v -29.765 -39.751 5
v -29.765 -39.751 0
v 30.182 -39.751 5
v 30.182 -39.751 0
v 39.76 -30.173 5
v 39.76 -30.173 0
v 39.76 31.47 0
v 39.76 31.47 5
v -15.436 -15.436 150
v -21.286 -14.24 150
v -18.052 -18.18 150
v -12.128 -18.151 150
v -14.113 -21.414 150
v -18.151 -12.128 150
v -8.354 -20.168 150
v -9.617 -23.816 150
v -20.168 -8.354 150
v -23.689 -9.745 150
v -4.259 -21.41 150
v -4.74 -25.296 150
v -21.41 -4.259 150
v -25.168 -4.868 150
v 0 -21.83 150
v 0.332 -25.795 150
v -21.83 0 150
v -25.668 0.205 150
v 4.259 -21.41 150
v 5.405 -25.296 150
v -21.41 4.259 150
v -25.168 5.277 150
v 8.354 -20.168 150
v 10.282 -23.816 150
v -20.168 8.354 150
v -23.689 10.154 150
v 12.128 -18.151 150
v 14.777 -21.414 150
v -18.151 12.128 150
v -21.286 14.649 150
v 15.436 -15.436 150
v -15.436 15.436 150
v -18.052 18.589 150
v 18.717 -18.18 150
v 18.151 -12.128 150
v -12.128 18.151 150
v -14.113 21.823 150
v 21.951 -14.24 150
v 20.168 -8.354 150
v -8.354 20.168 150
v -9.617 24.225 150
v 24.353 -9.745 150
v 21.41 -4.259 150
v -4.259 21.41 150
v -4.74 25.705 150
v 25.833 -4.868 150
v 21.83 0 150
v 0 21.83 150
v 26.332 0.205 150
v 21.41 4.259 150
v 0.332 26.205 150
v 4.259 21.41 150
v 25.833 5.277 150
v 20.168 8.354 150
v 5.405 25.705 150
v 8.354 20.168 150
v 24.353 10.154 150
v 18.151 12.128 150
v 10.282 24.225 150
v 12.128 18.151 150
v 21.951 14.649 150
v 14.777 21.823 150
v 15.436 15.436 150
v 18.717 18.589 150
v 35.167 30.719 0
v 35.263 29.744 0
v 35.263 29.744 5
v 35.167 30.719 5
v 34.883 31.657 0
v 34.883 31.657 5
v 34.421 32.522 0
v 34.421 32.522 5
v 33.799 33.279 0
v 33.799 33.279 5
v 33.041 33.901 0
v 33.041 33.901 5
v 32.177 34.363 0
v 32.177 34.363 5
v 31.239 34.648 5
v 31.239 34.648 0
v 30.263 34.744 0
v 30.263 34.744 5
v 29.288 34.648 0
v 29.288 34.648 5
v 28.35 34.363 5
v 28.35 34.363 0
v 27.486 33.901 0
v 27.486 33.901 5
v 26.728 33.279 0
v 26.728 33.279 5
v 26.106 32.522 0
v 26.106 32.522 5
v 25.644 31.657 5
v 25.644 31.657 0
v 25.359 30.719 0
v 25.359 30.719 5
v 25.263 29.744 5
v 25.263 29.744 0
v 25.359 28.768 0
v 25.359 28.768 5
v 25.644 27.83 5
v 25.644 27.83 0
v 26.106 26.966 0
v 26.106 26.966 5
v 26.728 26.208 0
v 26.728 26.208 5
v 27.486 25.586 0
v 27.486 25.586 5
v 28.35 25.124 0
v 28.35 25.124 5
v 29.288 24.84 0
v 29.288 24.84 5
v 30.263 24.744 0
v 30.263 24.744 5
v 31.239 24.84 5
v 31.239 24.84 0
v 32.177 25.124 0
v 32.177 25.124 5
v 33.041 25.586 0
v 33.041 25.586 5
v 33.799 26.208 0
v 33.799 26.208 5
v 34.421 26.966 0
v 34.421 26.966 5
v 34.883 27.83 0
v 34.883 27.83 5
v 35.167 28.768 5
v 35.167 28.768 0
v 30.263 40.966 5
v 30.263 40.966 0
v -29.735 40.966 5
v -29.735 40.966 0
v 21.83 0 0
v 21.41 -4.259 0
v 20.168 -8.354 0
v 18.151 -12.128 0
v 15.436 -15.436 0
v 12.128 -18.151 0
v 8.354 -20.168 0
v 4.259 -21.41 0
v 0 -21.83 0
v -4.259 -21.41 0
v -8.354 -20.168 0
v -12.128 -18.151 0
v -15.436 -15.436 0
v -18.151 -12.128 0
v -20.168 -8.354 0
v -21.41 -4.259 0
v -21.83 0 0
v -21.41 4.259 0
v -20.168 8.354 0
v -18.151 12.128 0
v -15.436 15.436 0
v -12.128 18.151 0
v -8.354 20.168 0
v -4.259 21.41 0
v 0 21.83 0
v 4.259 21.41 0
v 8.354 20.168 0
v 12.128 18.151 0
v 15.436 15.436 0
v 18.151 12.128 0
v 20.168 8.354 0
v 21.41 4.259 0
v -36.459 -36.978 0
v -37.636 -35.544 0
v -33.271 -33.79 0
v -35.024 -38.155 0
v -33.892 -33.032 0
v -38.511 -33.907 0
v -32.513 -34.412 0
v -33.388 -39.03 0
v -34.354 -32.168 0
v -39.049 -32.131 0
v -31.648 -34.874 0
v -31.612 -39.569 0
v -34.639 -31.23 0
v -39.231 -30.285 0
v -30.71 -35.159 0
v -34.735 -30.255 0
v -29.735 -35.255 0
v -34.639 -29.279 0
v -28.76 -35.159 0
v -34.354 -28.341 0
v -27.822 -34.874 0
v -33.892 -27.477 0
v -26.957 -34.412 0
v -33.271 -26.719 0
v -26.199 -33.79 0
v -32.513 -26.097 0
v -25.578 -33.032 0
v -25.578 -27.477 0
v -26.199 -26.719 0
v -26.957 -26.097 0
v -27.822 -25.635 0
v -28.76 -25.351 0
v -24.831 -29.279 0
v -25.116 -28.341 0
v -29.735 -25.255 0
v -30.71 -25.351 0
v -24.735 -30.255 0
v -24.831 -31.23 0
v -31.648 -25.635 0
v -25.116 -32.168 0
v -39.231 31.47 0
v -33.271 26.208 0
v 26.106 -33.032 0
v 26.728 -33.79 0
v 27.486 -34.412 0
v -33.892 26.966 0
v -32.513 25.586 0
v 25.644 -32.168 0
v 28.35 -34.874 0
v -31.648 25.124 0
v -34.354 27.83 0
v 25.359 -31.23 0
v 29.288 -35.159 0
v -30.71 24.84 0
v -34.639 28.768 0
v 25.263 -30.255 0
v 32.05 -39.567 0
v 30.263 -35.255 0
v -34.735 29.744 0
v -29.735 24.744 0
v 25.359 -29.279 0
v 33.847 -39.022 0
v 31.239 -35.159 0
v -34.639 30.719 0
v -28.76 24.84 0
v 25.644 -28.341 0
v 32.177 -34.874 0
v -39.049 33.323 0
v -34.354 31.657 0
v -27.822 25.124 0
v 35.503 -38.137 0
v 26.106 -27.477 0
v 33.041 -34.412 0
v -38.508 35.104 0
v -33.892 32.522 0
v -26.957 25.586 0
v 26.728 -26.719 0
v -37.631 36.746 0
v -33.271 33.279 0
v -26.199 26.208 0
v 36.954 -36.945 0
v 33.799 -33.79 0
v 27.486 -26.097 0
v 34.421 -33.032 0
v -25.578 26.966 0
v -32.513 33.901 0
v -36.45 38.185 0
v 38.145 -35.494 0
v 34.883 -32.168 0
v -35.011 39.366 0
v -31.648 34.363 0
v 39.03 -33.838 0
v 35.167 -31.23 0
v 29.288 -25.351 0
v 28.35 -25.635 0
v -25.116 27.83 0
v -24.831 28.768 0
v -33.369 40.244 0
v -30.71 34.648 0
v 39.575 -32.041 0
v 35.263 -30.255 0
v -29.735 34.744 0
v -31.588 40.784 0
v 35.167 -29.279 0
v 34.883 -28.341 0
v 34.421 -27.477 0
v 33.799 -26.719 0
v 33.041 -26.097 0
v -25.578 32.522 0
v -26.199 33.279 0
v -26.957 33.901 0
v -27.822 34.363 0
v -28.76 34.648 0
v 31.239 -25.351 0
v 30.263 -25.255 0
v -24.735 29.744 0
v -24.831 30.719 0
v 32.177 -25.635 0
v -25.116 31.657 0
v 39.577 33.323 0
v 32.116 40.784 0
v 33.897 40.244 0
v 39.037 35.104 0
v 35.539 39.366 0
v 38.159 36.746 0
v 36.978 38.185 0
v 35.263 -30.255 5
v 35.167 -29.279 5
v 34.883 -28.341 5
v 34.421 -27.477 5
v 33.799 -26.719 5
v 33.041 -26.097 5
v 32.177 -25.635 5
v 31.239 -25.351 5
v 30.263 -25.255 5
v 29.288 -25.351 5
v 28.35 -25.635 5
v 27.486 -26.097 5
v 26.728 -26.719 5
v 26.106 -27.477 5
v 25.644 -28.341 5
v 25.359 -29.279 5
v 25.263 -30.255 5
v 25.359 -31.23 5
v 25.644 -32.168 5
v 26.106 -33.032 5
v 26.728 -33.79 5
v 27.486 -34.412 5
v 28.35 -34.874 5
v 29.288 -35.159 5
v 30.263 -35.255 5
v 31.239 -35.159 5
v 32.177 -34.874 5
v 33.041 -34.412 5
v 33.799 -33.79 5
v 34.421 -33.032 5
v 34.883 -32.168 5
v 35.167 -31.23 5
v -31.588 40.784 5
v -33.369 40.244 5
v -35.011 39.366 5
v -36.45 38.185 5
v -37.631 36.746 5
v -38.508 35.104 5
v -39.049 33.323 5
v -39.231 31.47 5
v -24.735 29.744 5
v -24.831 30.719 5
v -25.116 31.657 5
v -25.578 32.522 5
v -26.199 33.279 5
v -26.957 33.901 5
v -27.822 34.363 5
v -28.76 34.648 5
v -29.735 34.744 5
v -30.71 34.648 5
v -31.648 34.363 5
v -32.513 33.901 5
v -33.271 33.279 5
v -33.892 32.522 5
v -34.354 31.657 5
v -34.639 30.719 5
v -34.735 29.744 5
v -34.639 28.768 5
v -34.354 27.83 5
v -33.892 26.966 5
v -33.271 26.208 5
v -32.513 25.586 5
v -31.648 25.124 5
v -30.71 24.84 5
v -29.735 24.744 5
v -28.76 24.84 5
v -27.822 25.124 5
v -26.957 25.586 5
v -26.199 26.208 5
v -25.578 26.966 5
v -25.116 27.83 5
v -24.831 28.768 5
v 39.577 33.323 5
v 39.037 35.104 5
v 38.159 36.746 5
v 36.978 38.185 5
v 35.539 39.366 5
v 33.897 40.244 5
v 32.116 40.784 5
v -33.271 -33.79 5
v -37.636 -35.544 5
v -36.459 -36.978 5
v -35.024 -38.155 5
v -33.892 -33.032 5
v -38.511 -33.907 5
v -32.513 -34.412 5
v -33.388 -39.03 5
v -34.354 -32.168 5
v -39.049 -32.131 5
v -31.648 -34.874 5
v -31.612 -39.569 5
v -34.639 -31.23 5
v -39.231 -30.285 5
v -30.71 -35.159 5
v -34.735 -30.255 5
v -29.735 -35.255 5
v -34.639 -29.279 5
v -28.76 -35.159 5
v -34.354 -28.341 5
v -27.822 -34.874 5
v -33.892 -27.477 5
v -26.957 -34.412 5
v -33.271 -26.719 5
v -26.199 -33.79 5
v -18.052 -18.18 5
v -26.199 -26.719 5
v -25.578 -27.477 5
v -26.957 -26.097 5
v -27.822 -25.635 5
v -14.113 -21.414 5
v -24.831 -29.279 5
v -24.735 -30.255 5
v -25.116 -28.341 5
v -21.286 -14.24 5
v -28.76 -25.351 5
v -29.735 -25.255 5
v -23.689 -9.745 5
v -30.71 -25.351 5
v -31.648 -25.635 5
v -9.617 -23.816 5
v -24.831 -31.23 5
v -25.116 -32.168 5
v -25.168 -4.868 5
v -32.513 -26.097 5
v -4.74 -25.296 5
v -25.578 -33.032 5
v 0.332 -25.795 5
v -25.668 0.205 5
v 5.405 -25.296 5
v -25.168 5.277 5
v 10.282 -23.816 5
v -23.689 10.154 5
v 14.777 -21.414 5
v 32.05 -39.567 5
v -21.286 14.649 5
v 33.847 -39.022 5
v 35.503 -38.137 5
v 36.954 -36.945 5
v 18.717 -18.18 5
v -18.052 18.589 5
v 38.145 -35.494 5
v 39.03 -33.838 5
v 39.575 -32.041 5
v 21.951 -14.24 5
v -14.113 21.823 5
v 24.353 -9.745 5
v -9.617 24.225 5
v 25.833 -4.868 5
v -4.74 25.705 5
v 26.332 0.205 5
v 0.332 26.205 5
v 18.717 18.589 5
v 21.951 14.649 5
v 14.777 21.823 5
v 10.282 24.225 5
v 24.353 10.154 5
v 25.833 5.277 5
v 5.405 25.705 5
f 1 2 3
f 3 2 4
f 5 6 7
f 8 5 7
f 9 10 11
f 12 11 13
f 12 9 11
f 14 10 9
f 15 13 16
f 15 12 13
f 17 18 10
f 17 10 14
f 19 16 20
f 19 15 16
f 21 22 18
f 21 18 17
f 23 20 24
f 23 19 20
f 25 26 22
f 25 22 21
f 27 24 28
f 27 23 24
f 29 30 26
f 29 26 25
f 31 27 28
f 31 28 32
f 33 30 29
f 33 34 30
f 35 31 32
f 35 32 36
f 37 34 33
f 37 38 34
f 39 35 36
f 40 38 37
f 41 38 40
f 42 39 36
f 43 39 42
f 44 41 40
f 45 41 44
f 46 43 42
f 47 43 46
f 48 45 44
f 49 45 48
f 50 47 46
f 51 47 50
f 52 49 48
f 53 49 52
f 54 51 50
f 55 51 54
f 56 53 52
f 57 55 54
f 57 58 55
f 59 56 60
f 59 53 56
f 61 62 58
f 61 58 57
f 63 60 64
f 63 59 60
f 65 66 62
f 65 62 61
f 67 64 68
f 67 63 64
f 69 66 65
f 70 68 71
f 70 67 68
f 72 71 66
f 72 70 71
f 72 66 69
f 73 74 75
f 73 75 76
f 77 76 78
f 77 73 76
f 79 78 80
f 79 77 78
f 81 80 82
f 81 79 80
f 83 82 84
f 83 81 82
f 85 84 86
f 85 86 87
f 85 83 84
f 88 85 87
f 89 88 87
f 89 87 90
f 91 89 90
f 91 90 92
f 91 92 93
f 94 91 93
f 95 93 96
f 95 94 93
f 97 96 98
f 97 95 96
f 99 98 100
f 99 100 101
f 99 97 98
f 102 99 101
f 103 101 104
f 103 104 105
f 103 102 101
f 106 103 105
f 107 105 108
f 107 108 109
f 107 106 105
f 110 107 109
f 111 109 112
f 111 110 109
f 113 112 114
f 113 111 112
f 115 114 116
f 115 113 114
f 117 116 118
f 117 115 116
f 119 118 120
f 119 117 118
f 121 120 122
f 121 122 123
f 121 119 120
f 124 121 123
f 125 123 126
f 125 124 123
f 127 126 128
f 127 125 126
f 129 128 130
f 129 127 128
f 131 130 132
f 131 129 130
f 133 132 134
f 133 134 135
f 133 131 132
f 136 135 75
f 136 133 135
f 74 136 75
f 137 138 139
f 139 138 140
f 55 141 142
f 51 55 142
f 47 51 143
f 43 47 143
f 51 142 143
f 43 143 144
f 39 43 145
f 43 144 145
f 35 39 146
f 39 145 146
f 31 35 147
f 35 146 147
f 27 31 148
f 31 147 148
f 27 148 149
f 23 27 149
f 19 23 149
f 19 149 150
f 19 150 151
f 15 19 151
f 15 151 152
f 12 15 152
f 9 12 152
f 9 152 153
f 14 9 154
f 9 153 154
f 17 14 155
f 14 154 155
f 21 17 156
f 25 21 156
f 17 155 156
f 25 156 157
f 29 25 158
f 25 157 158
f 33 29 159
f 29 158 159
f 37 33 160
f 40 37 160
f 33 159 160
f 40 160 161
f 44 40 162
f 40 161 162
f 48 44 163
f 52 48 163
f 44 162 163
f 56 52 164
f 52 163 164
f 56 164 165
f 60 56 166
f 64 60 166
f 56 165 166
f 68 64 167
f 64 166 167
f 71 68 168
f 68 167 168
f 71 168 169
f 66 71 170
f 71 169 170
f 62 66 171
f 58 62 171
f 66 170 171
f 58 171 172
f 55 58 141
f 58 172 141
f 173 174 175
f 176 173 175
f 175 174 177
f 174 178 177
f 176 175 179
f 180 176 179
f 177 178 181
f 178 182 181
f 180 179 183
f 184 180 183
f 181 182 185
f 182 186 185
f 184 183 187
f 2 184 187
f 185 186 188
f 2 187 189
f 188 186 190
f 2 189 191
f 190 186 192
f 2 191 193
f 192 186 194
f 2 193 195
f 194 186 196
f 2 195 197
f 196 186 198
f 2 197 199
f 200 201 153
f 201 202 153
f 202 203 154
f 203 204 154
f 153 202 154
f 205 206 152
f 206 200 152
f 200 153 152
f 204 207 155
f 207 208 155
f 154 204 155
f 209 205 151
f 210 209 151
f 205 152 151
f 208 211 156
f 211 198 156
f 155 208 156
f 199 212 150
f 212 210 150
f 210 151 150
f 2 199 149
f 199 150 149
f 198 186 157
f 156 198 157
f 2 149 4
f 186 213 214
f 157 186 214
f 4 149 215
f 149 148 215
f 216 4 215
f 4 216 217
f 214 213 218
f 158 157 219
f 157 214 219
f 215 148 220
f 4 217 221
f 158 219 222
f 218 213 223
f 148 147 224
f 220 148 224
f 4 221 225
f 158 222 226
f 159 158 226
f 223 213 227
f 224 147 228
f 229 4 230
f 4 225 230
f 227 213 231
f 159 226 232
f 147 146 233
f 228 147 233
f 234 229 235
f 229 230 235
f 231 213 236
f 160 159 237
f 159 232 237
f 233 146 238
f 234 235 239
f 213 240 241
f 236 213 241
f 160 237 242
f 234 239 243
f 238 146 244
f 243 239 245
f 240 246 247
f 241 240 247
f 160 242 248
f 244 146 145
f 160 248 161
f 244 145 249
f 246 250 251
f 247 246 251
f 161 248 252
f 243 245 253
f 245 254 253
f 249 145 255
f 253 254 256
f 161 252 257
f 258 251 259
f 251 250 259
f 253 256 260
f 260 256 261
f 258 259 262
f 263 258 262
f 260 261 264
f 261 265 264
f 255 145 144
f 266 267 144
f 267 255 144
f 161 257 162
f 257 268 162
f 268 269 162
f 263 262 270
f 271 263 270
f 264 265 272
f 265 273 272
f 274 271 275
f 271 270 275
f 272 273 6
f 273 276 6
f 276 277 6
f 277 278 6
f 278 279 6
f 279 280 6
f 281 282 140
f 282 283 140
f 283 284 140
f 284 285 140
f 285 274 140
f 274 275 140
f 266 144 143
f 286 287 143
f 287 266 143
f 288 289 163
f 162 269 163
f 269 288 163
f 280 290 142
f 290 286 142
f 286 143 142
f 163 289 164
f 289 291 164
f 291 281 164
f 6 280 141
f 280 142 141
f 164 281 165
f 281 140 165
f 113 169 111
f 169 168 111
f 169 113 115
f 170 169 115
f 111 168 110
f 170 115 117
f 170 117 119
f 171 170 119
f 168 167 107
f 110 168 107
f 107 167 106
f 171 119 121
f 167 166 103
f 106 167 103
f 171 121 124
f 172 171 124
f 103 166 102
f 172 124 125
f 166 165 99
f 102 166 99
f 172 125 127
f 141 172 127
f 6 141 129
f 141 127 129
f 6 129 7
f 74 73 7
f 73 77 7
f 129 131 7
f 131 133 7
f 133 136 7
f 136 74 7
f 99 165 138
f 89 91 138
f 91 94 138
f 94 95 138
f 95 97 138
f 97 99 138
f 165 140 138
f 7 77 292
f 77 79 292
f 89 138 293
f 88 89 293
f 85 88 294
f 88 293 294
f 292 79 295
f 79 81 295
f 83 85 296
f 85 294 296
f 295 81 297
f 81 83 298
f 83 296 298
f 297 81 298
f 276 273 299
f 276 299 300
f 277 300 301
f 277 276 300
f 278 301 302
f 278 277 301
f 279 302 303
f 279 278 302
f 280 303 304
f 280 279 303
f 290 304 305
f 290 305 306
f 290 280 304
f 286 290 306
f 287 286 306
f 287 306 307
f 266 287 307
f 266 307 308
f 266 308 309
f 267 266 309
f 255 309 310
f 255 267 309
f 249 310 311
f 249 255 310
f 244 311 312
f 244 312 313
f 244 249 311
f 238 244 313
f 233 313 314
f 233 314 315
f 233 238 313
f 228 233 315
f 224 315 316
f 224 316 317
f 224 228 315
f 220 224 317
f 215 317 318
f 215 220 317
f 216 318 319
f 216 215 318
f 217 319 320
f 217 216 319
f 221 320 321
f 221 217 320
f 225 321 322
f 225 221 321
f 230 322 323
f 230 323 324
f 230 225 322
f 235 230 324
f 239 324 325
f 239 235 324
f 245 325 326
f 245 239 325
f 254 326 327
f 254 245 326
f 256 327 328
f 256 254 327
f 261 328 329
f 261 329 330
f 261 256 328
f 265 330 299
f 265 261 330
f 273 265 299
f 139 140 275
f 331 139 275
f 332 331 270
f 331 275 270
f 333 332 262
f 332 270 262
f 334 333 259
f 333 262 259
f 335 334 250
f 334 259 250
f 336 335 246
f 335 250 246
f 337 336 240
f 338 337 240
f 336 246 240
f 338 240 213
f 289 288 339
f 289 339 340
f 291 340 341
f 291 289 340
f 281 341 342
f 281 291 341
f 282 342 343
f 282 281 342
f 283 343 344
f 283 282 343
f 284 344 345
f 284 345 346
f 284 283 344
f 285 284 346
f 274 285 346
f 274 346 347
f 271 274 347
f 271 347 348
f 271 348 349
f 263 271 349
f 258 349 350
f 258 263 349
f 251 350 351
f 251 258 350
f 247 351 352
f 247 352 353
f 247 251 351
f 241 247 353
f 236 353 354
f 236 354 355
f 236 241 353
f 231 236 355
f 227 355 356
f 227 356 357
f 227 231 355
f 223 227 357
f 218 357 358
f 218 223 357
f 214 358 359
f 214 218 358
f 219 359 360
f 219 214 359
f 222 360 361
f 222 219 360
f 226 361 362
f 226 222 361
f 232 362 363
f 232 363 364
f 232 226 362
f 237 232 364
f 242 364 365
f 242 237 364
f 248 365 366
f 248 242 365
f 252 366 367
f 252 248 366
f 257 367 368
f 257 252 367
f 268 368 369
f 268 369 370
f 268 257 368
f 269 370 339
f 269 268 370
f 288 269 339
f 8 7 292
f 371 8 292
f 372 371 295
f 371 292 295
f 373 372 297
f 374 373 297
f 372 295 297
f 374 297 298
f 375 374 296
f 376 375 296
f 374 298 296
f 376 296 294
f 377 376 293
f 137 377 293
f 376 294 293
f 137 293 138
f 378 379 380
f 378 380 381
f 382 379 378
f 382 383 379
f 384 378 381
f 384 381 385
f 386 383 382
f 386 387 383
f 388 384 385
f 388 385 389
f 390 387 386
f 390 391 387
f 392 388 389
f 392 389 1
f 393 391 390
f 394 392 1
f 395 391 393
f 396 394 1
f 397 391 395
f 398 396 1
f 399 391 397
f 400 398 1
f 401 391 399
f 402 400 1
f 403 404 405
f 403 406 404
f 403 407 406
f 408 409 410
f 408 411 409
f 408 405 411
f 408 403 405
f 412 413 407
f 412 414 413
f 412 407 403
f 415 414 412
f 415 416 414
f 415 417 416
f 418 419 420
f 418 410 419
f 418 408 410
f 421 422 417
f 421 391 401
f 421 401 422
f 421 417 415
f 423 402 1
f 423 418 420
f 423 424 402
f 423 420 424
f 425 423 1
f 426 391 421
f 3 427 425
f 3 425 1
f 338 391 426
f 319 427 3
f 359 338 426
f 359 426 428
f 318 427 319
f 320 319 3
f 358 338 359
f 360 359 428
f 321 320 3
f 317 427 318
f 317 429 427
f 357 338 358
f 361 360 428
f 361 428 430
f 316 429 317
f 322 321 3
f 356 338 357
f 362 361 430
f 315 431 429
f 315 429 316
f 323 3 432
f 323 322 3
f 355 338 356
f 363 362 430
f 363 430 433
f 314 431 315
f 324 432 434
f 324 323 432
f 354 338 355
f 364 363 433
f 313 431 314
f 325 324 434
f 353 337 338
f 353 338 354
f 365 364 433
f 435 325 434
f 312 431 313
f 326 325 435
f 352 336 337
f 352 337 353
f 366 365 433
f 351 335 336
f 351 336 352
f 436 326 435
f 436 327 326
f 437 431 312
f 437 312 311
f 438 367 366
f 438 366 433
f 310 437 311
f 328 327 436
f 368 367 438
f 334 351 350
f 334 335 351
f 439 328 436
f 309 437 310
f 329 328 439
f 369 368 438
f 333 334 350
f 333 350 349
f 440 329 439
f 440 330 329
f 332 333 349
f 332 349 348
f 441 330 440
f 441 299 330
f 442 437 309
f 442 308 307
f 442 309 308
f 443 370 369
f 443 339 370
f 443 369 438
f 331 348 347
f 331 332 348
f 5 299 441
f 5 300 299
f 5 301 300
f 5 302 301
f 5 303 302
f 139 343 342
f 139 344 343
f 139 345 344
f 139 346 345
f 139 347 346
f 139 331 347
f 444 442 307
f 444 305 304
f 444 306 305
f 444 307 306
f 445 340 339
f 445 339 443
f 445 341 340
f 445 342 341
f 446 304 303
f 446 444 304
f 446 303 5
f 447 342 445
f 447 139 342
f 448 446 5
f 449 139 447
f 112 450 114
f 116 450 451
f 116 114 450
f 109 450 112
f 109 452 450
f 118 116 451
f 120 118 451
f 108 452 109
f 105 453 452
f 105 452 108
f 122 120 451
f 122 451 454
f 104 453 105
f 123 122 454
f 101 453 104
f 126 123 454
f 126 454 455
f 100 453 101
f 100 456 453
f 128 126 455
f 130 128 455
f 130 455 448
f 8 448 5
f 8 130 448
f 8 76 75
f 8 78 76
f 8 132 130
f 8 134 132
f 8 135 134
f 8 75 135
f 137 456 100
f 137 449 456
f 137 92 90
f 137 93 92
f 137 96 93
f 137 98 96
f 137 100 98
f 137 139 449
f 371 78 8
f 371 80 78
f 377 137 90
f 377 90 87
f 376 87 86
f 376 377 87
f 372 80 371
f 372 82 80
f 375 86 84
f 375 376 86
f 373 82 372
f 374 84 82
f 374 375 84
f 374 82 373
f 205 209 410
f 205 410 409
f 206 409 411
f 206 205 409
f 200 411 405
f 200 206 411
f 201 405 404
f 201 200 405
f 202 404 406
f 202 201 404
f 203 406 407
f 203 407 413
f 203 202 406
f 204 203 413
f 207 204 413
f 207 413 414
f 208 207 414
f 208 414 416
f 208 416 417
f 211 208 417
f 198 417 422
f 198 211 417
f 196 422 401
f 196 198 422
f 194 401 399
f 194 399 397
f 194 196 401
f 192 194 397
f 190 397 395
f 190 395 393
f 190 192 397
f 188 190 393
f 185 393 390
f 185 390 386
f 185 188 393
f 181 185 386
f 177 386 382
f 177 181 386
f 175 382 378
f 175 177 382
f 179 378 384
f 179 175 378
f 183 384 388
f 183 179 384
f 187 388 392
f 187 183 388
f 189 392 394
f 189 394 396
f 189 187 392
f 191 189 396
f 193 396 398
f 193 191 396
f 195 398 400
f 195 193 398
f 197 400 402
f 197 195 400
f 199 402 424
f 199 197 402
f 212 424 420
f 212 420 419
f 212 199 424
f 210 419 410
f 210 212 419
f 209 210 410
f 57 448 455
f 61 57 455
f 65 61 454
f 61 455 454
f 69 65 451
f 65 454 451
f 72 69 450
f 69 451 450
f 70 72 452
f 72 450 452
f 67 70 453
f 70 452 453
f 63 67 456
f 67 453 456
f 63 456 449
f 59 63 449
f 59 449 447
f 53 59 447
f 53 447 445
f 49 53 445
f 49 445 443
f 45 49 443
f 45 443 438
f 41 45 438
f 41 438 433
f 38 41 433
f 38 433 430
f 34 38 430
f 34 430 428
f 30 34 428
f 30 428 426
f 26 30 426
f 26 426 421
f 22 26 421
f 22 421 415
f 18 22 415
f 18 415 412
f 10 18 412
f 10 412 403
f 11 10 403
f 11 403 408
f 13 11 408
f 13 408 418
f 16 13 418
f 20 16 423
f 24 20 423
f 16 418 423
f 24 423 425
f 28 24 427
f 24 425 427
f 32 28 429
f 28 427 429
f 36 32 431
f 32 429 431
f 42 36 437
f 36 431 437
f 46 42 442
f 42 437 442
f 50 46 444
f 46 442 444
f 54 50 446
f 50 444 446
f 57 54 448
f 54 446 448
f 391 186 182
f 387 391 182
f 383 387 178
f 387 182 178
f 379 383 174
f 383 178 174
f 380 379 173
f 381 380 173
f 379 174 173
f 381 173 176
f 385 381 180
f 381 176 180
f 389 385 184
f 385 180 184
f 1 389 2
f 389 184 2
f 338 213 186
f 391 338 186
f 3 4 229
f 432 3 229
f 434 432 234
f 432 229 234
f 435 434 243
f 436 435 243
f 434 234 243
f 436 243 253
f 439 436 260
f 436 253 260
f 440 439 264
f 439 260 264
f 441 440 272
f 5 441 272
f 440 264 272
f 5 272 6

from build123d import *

# Parameters (mm, degrees)
SKETCH_R     = 5
PAD_DEPTH    = 5
SKETCH002_R  = 26
PAD001_DEPTH = 150
SKETCH001_R  = 21.829625
POCKET_DEPTH = 150


with BuildPart() as part:
    # Sketch → Pad (new body)
    with BuildSketch(Plane.XY):
        with BuildLine():
            Line((-29.76506, -39.750771), (30.181718, -39.750771))
            ThreePointArc((30.181718, -39.750771), (36.954256, -36.945494), (39.759533, -30.172956))
            Line((39.759533, -30.172956), (39.759533, 31.470314))
            ThreePointArc((39.759533, 31.470314), (36.97817, 38.185117), (30.263367, 40.96648))
            Line((30.263367, 40.96648), (-29.735014, 40.96648))
            ThreePointArc((-29.735014, 40.96648), (-36.449803, 38.185124), (-39.231159, 31.470335))
            Line((-39.231159, 31.470335), (-39.231159, -30.284672))
            ThreePointArc((-39.231159, -30.284672), (-36.458603, -36.978215), (-29.76506, -39.750771))
        make_face()
        with Locations((-29.735014, 29.743769)):
            Circle(SKETCH_R, mode=Mode.SUBTRACT)
        with Locations((30.263367, 29.743769)):
            Circle(SKETCH_R, mode=Mode.SUBTRACT)
        with Locations((-29.735014, -30.254622)):
            Circle(SKETCH_R, mode=Mode.SUBTRACT)
        with Locations((30.263367, -30.254622)):
            Circle(SKETCH_R, mode=Mode.SUBTRACT)
    extrude(amount=PAD_DEPTH)

    # Sketch002 → Pad001 (join)
    with BuildSketch(Plane.XY):
        with Locations((0.332326, 0.20453)):
            Circle(SKETCH002_R)
    extrude(amount=PAD001_DEPTH)

    # Sketch001 (on Face13 of Pad) → Pocket (cut)
    with BuildSketch(Plane(origin=(0, 0, 0), x_dir=(1, 0, 0), z_dir=(0, 0, -1))):
        Circle(SKETCH001_R)
    extrude(amount=-POCKET_DEPTH, mode=Mode.SUBTRACT)


solid = part.part
